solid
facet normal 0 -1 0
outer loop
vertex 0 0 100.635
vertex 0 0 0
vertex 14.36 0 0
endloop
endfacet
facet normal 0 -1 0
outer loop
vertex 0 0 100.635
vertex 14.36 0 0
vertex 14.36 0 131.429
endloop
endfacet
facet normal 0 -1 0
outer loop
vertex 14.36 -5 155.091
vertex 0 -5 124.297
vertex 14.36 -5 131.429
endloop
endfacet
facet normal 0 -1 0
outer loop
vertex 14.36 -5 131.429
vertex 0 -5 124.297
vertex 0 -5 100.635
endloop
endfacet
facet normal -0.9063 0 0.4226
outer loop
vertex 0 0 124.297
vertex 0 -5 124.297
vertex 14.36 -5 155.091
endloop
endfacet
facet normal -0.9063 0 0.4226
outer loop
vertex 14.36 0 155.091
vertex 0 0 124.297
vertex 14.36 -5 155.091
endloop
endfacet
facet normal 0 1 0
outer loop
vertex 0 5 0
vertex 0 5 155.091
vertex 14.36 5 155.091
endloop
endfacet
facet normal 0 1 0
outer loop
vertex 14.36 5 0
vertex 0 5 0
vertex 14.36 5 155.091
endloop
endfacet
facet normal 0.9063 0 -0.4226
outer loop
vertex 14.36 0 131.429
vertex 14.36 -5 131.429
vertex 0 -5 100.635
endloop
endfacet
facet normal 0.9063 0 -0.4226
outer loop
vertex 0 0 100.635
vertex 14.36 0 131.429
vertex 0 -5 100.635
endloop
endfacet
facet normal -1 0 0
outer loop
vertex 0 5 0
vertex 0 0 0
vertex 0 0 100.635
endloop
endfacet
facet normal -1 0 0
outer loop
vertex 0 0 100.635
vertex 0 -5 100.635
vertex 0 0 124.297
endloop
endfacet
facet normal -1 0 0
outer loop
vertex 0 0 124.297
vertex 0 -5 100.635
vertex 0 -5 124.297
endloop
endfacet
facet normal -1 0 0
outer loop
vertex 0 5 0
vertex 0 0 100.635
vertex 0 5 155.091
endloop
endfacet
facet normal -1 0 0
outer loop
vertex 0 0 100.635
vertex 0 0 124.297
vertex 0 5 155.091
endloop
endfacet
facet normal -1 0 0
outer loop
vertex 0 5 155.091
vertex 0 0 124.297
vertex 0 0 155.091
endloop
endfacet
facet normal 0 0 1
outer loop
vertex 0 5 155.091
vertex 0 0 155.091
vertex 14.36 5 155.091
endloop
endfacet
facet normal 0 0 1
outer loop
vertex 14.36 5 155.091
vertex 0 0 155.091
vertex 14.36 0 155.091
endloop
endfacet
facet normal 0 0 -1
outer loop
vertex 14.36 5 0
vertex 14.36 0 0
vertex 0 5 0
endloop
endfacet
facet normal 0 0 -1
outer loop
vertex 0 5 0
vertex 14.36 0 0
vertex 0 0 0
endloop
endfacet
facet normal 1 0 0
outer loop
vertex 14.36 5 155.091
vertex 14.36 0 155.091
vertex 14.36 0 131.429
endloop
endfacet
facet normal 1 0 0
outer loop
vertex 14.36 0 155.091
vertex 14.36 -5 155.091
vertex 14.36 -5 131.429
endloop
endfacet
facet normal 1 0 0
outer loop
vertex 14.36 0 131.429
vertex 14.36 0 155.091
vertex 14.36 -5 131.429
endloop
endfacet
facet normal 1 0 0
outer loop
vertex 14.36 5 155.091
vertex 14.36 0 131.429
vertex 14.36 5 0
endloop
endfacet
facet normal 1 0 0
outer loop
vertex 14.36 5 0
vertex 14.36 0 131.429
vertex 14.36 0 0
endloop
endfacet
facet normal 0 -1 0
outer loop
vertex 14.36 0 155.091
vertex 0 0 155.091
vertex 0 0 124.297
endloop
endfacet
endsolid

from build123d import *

# Parameters (mm, degrees)
BOSS_EXTRUDE1_DEPTH = 5
BOSS_EXTRUDE2_START = -5
BOSS_EXTRUDE2_DEPTH = 5


# Read off the part's stored shape, not the designer's step: Boss-Extrude2
with BuildPart() as part:
    # Sketch1 → Boss-Extrude1 (new body)
    with BuildSketch(Plane(origin=(0, 0, 0), x_dir=(1, 0, 0), z_dir=(0, 1, 0))):
        Polygon((14.359671821, -155.090990788), (0, -124.296575192), (0, -155.090990788), align=None)
        Polygon((0, -100.63455936), (0, -124.296575192), (14.359671821, -155.090990788), (14.359671821, -131.428974957), align=None)
        Polygon((0, 0), (0, -100.63455936), (14.359671821, -131.428974957), (14.359671821, 0), align=None)
    extrude(amount=BOSS_EXTRUDE1_DEPTH)

    # Boss-Extrude2 outline → Boss-Extrude2 (add)
    with BuildSketch(Plane(origin=(0, 0, 0), x_dir=(1, 0, 0), z_dir=(0, 1, 0)).offset(BOSS_EXTRUDE2_START)):
        Polygon((0, -100.63455936), (0, -124.296575192), (14.359671821, -155.090990788), (14.359671821, -131.428974957), align=None)
    extrude(amount=BOSS_EXTRUDE2_DEPTH)


solid = part.part
